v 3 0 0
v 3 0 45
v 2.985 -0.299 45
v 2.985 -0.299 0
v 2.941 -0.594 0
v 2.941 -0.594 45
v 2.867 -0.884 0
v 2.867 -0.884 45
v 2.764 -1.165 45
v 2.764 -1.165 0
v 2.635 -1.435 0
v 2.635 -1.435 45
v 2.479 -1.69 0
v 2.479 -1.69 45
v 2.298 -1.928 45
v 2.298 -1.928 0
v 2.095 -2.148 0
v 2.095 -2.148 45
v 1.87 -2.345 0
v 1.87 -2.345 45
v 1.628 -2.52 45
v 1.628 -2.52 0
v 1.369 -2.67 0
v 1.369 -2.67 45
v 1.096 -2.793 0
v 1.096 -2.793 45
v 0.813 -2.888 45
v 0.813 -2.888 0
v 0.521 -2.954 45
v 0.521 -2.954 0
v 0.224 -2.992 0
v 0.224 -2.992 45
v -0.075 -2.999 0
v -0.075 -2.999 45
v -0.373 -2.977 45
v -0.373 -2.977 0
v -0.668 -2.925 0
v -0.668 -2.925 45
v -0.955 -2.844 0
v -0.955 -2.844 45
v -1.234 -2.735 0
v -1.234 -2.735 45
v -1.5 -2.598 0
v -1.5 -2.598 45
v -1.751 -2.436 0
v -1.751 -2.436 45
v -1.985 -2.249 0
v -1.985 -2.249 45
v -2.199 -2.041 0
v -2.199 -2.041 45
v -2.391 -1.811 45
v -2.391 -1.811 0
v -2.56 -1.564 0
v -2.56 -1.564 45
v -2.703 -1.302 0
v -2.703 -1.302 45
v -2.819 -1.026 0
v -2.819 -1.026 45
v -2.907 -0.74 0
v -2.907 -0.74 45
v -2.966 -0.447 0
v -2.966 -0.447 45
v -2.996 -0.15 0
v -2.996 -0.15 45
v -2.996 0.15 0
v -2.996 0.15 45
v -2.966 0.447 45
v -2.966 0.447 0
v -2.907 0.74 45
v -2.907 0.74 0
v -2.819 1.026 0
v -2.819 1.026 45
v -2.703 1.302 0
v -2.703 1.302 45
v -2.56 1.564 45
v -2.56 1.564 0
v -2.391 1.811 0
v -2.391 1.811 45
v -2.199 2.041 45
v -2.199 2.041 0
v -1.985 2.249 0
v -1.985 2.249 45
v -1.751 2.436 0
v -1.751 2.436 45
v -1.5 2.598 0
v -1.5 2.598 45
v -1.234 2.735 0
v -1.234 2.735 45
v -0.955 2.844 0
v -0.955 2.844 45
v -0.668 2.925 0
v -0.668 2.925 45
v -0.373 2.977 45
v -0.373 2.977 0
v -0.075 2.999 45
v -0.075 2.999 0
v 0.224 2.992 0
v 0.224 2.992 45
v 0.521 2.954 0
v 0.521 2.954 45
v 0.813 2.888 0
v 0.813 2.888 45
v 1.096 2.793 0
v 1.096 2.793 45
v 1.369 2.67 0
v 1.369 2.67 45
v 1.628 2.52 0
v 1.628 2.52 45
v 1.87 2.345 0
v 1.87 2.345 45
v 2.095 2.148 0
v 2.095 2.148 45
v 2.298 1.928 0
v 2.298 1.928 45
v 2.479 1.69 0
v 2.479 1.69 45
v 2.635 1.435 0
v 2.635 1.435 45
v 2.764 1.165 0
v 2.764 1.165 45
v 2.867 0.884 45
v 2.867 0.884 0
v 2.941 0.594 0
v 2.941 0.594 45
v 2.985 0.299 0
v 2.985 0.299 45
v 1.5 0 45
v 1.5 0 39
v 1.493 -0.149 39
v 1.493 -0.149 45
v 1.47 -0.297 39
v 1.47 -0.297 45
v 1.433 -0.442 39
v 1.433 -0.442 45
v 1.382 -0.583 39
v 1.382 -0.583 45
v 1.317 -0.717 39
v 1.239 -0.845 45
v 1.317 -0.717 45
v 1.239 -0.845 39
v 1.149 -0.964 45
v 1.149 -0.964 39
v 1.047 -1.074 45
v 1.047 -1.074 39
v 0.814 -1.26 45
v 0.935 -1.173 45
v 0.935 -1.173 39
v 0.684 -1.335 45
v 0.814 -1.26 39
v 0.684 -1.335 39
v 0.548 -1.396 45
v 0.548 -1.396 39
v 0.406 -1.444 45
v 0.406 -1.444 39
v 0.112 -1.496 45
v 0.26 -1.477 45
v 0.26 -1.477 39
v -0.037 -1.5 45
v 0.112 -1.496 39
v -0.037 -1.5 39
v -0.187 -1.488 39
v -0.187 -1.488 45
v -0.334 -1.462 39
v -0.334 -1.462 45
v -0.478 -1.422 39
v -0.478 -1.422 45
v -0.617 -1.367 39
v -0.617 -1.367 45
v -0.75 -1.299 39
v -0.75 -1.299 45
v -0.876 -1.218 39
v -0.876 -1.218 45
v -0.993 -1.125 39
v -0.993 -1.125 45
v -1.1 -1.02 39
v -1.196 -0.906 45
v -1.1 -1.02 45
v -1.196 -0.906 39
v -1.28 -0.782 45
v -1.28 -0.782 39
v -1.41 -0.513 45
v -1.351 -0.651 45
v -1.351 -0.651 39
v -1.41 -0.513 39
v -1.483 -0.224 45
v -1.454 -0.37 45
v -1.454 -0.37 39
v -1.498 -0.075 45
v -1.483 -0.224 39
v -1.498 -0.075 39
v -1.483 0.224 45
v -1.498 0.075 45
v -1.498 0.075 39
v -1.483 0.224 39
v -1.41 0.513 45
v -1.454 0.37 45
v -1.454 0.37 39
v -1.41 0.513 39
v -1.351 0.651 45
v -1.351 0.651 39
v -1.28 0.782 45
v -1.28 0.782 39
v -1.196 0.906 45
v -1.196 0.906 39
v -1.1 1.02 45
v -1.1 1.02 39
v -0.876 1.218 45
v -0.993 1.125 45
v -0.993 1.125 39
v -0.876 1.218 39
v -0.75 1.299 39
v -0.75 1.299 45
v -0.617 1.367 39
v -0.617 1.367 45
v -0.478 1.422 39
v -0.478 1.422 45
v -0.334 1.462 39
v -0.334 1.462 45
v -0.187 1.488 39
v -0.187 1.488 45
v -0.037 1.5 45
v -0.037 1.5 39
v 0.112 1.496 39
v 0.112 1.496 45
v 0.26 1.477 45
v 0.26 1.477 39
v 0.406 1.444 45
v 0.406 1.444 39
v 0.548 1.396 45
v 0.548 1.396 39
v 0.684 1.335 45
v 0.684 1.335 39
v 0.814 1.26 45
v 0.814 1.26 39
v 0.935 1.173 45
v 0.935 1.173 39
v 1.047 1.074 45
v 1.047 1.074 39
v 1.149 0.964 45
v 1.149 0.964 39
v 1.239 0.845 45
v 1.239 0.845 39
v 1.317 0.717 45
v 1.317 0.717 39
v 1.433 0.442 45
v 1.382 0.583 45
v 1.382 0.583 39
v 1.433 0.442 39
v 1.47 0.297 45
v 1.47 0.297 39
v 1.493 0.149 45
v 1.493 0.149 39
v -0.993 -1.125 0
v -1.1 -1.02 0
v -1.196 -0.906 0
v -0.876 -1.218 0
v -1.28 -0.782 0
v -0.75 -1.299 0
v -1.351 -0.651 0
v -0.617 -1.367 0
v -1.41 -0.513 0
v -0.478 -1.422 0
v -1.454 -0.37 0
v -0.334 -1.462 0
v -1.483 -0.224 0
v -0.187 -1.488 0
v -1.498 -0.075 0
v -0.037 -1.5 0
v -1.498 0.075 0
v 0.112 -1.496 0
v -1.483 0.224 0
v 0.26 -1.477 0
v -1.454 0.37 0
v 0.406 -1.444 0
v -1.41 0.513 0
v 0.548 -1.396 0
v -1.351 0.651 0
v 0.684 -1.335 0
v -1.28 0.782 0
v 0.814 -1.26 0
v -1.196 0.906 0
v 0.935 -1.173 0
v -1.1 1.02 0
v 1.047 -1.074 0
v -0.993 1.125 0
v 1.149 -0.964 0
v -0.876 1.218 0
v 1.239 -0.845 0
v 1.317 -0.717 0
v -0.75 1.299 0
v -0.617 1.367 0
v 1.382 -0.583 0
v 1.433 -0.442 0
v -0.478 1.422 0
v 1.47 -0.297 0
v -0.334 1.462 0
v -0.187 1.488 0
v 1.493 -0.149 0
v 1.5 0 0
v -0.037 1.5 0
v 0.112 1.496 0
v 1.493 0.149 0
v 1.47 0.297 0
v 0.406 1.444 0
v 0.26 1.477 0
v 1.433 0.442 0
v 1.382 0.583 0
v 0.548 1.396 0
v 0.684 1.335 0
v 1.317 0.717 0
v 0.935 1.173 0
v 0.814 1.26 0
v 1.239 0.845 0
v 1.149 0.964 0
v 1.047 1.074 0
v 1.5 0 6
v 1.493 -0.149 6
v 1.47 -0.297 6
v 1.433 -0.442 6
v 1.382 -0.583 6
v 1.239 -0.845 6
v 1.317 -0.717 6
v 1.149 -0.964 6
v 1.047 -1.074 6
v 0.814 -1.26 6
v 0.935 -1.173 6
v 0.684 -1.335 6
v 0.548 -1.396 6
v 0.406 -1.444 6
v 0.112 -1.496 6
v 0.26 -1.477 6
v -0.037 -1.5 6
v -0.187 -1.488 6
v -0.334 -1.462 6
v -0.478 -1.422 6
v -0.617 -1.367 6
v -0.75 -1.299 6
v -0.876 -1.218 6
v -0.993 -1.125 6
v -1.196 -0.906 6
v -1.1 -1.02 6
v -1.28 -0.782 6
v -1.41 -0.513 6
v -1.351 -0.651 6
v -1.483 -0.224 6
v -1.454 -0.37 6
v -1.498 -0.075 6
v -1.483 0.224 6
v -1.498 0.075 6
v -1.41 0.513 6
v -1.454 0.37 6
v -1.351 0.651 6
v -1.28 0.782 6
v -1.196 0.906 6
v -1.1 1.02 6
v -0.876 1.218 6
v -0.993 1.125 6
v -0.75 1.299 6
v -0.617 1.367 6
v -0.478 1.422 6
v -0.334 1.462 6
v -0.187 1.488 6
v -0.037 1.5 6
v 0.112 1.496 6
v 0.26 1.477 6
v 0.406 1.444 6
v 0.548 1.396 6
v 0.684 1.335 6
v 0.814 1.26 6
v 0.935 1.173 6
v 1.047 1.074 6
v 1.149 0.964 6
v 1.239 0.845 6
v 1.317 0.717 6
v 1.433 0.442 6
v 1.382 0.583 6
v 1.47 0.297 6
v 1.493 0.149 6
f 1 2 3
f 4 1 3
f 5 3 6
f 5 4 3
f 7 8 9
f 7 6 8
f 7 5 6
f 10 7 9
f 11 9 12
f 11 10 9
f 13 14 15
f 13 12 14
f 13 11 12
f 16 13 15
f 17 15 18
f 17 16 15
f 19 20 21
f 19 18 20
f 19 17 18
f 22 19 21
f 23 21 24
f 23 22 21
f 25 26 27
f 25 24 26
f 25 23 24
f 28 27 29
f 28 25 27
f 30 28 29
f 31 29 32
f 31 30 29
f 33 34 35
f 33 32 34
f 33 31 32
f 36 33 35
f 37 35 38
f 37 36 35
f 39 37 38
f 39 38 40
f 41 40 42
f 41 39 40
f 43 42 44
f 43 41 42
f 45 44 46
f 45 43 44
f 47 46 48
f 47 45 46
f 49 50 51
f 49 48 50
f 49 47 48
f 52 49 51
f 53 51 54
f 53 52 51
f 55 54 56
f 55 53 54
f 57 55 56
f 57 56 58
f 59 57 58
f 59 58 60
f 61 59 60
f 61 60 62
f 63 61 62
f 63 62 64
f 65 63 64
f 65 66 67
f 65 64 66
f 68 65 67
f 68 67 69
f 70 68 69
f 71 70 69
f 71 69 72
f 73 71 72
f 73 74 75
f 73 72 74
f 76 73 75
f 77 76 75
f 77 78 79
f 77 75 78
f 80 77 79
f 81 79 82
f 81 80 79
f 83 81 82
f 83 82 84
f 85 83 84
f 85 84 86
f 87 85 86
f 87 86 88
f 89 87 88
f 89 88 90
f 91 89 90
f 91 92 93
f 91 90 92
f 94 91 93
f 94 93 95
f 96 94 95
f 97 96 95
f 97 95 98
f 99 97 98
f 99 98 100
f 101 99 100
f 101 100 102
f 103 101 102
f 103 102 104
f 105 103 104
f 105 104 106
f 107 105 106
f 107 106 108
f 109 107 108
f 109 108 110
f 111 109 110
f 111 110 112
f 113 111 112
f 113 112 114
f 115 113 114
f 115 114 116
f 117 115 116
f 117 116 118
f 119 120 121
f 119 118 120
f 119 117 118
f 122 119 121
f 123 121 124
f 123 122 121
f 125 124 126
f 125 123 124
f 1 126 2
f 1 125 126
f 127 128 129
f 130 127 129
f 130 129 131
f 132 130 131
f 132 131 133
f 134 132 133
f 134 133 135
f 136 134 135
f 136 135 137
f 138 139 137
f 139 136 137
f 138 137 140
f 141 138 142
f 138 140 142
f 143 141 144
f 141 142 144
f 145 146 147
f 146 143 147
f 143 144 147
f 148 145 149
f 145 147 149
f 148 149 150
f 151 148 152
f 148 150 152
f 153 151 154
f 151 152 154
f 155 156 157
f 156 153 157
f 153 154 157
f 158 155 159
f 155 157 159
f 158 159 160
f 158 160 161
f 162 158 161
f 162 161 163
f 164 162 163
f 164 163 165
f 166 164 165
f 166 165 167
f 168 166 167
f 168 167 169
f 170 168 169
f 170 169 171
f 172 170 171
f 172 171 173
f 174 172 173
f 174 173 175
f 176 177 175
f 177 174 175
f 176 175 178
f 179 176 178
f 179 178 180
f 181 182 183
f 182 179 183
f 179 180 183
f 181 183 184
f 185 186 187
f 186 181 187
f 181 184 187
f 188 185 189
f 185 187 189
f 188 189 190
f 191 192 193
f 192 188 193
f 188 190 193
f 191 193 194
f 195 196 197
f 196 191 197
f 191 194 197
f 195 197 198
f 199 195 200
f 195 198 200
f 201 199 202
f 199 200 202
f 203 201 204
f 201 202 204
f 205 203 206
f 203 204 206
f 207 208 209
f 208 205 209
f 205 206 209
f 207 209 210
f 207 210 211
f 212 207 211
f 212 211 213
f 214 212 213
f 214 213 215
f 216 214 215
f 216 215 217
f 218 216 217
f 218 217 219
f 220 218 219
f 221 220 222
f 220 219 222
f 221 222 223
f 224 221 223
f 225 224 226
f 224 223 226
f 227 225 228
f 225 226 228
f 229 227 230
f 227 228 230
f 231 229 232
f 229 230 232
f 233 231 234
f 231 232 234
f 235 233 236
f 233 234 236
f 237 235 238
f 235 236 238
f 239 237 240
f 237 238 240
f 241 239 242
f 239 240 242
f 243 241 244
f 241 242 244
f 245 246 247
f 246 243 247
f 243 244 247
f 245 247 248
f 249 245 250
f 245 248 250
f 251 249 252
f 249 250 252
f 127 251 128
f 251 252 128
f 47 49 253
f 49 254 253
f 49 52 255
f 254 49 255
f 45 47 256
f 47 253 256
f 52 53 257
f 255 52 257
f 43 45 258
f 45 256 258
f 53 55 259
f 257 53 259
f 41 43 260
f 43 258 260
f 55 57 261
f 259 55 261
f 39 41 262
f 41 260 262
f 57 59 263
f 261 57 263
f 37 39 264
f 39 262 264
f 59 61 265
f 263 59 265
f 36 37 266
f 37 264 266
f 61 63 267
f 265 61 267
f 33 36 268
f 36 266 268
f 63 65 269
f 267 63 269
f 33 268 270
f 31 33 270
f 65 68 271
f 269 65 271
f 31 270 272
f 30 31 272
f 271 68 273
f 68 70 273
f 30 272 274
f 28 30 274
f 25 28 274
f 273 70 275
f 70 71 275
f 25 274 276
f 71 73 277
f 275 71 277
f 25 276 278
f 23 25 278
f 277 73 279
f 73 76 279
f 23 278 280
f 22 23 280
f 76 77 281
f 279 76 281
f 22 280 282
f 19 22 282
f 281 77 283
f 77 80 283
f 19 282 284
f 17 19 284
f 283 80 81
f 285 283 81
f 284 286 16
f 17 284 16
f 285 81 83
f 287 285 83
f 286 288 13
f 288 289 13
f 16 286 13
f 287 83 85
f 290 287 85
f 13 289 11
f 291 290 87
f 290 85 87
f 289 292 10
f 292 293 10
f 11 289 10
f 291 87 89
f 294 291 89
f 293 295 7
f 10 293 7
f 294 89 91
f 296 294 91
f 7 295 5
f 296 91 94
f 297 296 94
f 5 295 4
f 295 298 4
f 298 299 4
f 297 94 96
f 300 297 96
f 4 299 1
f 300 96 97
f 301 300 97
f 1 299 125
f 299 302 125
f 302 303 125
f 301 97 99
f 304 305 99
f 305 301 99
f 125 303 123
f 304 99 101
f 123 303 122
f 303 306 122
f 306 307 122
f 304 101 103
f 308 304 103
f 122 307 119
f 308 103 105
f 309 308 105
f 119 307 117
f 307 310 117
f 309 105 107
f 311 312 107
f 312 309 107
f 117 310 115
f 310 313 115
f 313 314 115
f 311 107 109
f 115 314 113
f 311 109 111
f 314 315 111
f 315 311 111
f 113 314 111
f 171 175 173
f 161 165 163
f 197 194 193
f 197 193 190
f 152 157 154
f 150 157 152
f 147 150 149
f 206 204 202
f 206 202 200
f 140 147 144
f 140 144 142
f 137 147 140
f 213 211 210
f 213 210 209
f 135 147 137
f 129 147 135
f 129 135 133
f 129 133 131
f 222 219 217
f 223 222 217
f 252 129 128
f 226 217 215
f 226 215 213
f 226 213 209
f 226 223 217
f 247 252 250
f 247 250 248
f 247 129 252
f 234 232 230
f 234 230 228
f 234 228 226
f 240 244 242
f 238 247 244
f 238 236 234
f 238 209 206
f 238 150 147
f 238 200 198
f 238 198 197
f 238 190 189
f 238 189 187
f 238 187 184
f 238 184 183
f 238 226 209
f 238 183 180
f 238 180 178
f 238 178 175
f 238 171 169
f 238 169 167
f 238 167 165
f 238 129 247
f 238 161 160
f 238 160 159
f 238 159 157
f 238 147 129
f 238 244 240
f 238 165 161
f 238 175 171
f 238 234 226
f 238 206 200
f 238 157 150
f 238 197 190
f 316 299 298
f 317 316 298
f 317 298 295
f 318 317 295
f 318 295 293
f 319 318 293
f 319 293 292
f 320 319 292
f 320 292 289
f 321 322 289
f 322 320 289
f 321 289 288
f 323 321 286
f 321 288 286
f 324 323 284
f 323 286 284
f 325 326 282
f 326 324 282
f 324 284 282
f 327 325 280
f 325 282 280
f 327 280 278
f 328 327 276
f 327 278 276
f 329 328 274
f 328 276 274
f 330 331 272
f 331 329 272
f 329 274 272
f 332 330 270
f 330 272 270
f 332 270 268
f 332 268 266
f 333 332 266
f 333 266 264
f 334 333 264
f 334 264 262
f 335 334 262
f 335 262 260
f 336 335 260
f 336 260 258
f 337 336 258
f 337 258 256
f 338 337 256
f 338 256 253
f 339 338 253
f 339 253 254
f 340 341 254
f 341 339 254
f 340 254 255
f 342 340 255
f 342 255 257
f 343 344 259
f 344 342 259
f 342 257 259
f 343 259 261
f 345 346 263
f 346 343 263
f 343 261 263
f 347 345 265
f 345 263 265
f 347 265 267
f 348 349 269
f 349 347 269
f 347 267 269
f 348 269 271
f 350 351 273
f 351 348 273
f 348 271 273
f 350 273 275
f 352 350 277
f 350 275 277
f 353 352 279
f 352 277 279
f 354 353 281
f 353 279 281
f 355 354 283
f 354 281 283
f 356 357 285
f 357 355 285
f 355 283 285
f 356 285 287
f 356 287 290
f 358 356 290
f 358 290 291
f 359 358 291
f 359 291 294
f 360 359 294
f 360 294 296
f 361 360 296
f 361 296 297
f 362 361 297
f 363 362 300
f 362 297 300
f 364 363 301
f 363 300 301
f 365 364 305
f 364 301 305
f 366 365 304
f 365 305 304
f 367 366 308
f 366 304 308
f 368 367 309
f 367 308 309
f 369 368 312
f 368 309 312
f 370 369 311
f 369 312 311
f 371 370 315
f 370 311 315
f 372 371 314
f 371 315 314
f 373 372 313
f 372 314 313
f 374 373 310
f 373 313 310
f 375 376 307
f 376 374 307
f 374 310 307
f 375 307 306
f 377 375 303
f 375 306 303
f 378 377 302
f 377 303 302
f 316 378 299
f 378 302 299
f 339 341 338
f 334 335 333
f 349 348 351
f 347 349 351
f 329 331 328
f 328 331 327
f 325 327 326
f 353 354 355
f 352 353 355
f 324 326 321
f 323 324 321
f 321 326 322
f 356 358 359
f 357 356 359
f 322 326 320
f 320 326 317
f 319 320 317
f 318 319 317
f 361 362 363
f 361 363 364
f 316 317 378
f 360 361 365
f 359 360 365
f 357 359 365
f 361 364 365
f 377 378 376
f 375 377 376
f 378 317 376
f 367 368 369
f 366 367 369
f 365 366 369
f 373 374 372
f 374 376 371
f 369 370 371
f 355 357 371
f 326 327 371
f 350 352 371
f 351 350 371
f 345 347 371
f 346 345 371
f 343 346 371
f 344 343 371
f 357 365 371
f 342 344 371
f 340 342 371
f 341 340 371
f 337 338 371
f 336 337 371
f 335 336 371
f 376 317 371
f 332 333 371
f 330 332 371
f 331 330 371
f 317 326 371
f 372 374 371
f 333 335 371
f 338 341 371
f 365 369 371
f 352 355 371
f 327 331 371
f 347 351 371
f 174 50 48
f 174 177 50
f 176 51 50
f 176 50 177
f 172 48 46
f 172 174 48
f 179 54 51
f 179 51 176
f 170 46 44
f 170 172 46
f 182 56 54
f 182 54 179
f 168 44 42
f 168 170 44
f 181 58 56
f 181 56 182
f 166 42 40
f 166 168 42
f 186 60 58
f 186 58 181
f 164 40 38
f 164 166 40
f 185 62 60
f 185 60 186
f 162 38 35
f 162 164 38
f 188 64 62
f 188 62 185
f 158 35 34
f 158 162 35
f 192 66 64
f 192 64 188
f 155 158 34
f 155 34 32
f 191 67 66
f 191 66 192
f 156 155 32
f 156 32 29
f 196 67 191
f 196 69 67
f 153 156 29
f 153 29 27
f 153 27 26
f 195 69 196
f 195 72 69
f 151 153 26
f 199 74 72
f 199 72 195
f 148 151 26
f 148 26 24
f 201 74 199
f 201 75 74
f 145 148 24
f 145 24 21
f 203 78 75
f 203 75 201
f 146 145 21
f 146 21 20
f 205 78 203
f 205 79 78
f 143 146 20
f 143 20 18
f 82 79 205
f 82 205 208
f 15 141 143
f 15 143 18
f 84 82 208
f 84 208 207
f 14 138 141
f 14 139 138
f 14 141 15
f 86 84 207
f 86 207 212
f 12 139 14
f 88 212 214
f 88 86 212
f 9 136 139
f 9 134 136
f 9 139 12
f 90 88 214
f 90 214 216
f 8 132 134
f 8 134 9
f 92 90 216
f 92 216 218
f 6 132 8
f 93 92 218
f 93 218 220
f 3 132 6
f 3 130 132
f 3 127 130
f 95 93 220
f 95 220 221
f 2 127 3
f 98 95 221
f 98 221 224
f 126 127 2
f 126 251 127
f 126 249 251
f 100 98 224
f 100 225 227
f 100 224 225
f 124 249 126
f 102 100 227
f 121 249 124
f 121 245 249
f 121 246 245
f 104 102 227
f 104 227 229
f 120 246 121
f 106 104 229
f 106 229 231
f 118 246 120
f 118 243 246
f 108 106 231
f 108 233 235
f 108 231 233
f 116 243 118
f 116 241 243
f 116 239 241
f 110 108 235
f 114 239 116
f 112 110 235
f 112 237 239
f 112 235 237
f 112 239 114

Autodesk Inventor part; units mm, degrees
ref_plane "YZ Plane" through (0, 0, 0) normal (1, 0, 0) x (0, 1, 0)
ref_plane "XZ Plane" through (0, 0, 0) normal (0, 1, 0) x (-1, 0, 0)
sketch "スケッチ1" plane through (0, 0, 0) normal (0, 0, 1) x (1, 0, 0)
  circle A0 centre (0, 0) radius 3
  circle A1 centre (0, 0) radius 1.5
  dimension "d0" = 6
  dimension "d1" = 3
extrude "押し出し1" add sketch "スケッチ1" along normal blind 45
ref_plane "作業平面1" through (0, 0, 39) normal (0, 0, 1) x (1, 0, 0)
sketch "スケッチ2" plane through (0, 0, 39) normal (0, 0, 1) x (1, 0, 0)
  point P0 (0, 0)
sketch "スケッチ3" plane through (0, 0, 39) normal (0, 0, 1) x (1, 0, 0)
  circle A0 centre (0, 0) radius 1.5 projected
  circle A1 centre (0, 0) radius 3 projected
extrude "押し出し2" add sketch "スケッチ3" against normal blind 33 contours A0
properties part number "ABSスペーサーm3-45　簡易筒型" material "ABS プラスチック"
